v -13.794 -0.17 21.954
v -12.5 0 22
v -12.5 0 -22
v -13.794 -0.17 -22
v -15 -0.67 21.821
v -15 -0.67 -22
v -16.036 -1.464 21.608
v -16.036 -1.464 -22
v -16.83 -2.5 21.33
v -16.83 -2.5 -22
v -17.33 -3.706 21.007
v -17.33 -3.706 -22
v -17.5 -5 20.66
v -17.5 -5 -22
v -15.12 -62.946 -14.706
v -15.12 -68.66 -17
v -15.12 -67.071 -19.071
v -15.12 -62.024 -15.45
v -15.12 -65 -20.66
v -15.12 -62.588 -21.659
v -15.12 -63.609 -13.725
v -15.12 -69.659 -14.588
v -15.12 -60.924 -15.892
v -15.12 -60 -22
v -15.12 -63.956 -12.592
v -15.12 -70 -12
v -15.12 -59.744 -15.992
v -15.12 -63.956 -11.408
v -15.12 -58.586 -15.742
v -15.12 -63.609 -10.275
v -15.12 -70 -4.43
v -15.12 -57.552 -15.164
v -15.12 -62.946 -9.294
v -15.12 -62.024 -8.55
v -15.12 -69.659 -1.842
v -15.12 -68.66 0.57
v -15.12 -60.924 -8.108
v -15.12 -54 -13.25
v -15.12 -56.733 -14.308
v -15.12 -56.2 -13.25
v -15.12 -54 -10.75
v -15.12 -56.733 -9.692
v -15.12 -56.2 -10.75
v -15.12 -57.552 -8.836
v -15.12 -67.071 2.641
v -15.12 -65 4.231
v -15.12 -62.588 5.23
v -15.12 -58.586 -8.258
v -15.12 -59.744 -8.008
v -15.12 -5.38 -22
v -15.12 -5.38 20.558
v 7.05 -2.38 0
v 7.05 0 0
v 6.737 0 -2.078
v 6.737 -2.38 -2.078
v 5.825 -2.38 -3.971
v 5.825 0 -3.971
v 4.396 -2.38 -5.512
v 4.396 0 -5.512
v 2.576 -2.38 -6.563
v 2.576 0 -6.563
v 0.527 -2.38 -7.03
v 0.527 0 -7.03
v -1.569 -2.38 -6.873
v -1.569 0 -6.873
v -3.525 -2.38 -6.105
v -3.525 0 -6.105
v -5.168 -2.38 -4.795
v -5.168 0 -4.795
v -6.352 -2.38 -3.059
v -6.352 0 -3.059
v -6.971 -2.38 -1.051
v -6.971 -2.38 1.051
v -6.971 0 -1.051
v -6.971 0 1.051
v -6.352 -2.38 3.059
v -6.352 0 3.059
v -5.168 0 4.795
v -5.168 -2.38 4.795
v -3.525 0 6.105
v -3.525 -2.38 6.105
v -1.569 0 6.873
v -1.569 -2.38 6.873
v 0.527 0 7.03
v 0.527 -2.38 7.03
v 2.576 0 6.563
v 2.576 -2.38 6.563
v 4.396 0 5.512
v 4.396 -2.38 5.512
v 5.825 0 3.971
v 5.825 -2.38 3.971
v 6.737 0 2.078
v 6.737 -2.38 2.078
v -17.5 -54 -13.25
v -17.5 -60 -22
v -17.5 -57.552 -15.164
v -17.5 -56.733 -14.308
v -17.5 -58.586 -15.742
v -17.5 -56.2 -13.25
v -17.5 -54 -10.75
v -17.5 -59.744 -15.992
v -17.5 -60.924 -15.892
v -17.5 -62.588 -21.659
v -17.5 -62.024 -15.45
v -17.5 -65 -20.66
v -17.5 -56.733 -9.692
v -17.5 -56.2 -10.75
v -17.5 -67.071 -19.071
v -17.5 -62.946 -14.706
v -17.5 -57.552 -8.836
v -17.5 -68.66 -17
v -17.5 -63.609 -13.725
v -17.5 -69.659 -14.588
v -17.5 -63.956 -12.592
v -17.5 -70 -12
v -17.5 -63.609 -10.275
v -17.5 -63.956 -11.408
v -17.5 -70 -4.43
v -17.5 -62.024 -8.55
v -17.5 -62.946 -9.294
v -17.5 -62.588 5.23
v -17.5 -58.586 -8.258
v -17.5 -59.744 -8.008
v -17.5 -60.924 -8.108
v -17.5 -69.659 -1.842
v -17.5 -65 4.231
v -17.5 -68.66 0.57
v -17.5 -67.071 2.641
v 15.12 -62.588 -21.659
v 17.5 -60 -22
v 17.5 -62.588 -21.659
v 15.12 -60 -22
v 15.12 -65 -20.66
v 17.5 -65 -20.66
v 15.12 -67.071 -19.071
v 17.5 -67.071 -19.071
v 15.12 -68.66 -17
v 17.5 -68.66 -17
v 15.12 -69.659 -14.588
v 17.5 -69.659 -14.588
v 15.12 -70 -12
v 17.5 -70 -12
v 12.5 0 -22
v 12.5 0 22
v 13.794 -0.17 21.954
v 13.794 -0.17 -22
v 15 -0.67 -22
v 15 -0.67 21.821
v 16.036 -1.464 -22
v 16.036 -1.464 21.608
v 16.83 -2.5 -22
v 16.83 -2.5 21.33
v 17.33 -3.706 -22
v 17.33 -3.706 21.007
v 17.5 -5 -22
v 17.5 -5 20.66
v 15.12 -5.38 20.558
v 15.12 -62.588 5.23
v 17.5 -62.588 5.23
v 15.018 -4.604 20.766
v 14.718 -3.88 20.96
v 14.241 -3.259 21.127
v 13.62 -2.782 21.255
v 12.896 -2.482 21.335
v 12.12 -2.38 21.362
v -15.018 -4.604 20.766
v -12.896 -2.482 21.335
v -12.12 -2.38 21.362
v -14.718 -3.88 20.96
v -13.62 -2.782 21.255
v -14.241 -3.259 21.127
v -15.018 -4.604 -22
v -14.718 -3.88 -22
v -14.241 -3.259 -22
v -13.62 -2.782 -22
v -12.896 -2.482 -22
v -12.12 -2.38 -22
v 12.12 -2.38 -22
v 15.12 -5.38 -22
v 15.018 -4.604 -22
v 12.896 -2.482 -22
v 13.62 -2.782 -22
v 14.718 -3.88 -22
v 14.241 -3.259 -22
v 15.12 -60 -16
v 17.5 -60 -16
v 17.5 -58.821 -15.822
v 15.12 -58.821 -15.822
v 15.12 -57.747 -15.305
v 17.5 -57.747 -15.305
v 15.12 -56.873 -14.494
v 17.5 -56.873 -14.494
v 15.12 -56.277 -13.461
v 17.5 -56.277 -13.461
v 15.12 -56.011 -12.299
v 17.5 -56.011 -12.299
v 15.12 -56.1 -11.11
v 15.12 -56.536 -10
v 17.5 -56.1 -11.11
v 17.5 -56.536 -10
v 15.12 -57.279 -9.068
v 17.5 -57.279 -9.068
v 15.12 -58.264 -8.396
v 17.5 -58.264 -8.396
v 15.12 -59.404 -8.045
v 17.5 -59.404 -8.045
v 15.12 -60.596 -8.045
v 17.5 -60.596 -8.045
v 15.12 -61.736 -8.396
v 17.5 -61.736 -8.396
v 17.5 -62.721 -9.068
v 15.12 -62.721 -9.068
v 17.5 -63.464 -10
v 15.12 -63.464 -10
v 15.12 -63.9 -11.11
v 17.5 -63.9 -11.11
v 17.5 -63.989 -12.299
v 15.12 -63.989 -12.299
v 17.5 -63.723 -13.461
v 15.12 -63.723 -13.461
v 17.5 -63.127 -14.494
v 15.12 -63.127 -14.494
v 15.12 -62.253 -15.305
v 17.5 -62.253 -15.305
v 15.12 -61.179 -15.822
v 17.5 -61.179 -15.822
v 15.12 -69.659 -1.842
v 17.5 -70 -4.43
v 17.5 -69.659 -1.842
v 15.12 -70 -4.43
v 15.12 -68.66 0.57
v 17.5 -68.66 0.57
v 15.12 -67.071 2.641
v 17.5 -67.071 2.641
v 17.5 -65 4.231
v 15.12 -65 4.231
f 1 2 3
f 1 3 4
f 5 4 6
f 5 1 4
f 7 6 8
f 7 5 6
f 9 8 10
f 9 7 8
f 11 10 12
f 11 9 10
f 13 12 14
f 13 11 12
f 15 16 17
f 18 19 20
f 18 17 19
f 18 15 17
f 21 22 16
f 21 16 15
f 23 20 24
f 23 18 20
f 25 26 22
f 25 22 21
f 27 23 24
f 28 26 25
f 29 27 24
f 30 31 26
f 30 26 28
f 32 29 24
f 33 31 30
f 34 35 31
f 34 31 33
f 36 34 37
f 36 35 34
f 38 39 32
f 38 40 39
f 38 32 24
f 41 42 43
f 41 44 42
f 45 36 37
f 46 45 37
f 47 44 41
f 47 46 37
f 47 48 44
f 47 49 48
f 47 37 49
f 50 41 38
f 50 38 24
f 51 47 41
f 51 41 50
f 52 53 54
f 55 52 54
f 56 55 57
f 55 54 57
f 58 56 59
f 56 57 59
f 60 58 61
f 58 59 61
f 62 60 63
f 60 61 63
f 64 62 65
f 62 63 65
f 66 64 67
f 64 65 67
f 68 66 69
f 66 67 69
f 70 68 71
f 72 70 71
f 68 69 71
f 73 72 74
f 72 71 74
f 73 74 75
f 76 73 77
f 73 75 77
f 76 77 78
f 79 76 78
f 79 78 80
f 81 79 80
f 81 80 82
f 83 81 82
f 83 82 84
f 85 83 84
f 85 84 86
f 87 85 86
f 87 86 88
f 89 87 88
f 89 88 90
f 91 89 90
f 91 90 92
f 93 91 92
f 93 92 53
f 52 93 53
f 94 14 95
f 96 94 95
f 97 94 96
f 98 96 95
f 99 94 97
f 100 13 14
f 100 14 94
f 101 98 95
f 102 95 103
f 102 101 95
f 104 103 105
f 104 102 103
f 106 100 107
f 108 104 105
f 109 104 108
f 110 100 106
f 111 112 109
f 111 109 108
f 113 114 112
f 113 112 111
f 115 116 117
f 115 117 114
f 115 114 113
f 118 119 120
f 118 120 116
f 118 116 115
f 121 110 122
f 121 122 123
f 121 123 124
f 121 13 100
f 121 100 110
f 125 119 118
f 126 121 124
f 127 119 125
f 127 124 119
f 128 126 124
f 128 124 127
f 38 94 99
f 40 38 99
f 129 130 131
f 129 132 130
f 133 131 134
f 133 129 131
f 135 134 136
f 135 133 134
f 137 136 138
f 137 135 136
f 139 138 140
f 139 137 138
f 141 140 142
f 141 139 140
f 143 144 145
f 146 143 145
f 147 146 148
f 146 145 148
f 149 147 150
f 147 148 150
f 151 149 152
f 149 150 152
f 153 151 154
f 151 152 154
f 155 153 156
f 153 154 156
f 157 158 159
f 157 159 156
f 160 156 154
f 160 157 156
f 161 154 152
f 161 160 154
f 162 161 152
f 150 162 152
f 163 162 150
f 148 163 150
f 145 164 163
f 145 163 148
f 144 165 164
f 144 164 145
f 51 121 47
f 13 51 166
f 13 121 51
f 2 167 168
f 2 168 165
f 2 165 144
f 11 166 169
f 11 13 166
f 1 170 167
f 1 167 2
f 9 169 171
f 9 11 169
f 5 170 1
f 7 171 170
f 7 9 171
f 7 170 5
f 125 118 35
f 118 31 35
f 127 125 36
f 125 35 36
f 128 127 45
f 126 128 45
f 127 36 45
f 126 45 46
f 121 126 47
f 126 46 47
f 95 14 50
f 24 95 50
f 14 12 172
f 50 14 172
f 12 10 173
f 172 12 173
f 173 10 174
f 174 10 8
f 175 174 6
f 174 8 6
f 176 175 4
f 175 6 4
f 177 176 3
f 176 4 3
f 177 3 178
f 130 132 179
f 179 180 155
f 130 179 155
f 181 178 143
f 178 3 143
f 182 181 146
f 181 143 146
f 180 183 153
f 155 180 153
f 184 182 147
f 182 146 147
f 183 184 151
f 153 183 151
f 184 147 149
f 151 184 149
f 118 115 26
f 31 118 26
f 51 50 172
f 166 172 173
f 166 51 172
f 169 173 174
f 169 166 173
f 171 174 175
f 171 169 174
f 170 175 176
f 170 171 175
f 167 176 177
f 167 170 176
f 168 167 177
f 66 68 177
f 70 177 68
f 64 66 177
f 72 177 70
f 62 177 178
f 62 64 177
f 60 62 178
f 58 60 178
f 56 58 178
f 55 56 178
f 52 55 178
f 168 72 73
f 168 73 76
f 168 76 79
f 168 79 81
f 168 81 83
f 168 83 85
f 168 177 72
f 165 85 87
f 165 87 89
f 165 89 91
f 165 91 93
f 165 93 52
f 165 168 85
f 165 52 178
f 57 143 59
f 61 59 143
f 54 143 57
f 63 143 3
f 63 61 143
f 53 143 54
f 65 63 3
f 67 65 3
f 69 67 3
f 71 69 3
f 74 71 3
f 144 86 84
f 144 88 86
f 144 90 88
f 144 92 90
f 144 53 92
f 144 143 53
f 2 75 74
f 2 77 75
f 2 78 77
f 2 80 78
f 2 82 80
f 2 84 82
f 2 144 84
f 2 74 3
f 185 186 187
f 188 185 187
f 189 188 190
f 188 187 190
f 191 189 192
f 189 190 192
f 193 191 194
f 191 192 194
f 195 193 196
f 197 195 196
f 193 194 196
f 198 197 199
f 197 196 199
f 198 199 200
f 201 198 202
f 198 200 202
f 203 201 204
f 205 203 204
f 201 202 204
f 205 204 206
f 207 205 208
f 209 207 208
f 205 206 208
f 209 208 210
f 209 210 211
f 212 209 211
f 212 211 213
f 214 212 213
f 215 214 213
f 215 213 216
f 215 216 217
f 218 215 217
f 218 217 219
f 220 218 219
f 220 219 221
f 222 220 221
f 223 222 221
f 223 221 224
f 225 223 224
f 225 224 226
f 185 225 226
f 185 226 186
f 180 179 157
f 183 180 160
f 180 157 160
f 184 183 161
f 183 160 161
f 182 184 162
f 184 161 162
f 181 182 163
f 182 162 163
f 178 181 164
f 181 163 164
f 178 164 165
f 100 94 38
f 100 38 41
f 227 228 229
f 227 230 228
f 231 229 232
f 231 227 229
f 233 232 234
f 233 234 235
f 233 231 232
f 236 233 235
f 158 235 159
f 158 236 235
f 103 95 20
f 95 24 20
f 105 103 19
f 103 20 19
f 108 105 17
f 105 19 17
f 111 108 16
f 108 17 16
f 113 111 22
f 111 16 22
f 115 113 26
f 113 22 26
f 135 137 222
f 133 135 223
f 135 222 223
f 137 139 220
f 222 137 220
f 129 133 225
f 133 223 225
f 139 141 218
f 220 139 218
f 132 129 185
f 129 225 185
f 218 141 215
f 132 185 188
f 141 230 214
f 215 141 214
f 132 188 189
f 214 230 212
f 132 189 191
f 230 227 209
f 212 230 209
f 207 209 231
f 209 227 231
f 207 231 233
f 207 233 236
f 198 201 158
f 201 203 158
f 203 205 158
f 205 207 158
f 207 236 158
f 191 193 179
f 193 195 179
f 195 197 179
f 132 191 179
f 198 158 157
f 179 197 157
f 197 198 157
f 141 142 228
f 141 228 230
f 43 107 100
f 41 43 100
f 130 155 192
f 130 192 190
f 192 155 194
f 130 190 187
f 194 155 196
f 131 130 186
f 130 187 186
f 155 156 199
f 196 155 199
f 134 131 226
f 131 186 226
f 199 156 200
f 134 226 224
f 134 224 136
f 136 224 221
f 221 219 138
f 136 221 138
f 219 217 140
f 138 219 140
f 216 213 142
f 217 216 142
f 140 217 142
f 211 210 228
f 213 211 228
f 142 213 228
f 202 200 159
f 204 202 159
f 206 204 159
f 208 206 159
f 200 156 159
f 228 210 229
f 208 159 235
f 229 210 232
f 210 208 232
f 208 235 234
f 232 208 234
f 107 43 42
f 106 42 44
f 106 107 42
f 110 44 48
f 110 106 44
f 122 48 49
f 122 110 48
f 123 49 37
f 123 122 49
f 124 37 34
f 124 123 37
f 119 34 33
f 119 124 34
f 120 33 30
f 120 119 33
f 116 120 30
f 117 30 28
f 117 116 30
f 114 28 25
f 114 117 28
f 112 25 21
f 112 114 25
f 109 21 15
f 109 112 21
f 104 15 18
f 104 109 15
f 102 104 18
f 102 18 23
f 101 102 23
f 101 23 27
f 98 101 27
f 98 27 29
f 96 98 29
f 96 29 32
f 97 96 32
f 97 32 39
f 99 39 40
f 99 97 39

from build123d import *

# Parameters (mm, degrees)
BOSS_EXTRUDE1_DEPTH = 22
CUT_EXTRUDE1_DEPTH  = 18.5
SKETCH4_R           = 4
CUT_EXTRUDE2_DEPTH  = 18.5
FILLET2_R           = 10
FILLET3_R           = 10
SKETCH5_R           = 7.05
CUT_EXTRUDE3_DEPTH  = 71
CUT_EXTRUDE6_REACH  = 37


with BuildPart() as part:
    # Sketch1 → Boss-Extrude1 (new body, symmetric)
    with BuildSketch(Plane.XY):
        with BuildLine():
            Line((0, 0), (12.5, 0))
            ThreePointArc((12.5, 0), (16.035533906, -1.464466094), (17.5, -5))
            Line((17.5, -5), (17.5, -70))
            Line((17.5, -70), (15.12, -70))
            Line((15.12, -70), (15.12, -5.38))
            ThreePointArc((15.12, -5.38), (14.241320344, -3.258679656), (12.12, -2.38))
            Line((12.12, -2.38), (0, -2.38))
            Line((0, -2.38), (0, 0))
        make_face()
    extrude(amount=BOSS_EXTRUDE1_DEPTH, both=True)

    # Sketch3 → Cut-Extrude1 (cut, through all)
    with BuildSketch(Plane(origin=(17.5, 0, 0), x_dir=(0, 0, -1), z_dir=(1, 0, 0))):
        Polygon((-22, 0), (-22, -70), (-3.24355653, -70), align=None)
    extrude(amount=-CUT_EXTRUDE1_DEPTH, mode=Mode.SUBTRACT)

    # Sketch4 → Cut-Extrude2 (cut, through all)
    with BuildSketch(Plane(origin=(17.5, 0, 0), x_dir=(0, 0, -1), z_dir=(1, 0, 0))):
        with Locations((12, -60)):
            Circle(SKETCH4_R)
    extrude(amount=-CUT_EXTRUDE2_DEPTH, mode=Mode.SUBTRACT)

    # Fillet2
    fillet2_edges = [part.edges().sort_by_distance(p)[0] for p in [
        (16.31, -70, -22),
    ]]
    fillet(fillet2_edges, radius=FILLET2_R)

    # Fillet3
    fillet3_edges = [part.edges().sort_by_distance(p)[0] for p in [
        (16.31, -70, 3.24355653),
    ]]
    fillet(fillet3_edges, radius=FILLET3_R)

    # Mirror1: part across plane


with BuildPart() as part_1:
    add(part.part)
    add(part.part.mirror(Plane(origin=(0, 0, 0), x_dir=(0, 0, 1), z_dir=(1, 0, 0))))

    # Sketch5 → Cut-Extrude3 (cut, through all)
    with BuildSketch(Plane(origin=(0, 0, 0), x_dir=(1, 0, 0), z_dir=(0, 1, 0))):
        Circle(SKETCH5_R)
    extrude(amount=-CUT_EXTRUDE3_DEPTH, mode=Mode.SUBTRACT)

    # Sketch7 → Cut-Extrude6 (cut, up to next)
    with BuildSketch(Plane.ZY.offset(17.5), mode=Mode.PRIVATE) as cut_extrude6_sk1:
        Polygon((-13.25, -54), (-10.75, -54), (-10.75, -56.200328962), (-10.75, -56.332123316), (-13.25, -56.332123316), (-13.25, -56.200328962), align=None)
    cut_extrude6_tool1 = extrude(cut_extrude6_sk1.sketch, amount=-CUT_EXTRUDE6_REACH, mode=Mode.PRIVATE) & part_1.part
    add(cut_extrude6_tool1.solids().sort_by_distance((-17.5, -55.166062, -12))[0], mode=Mode.SUBTRACT)


solid = part_1.part
